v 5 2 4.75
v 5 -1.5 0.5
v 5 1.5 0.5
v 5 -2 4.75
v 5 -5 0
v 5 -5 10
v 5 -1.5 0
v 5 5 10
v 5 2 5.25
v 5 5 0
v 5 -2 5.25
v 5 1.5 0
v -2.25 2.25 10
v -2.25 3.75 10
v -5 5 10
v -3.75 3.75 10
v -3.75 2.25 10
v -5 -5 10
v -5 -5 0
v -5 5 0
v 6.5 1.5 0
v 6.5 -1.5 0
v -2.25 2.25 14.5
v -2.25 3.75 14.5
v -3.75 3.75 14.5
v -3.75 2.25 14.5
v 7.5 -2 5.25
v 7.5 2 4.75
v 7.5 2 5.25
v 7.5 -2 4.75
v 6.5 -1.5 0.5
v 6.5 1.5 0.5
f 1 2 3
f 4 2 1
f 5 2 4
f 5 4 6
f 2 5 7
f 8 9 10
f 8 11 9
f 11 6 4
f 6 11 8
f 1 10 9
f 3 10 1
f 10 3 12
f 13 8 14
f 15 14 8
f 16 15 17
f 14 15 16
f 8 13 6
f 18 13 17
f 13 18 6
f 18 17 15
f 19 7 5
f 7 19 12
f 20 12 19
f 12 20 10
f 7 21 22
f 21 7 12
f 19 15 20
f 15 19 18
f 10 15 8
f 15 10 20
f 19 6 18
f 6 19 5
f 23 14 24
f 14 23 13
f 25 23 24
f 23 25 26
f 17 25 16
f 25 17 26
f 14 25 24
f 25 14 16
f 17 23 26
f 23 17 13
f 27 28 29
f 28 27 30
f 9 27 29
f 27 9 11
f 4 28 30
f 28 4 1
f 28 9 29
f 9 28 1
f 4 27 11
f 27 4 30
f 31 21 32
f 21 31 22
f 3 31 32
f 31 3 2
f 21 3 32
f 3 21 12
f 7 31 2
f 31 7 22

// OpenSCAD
//main base
translate([0,0,5])
    cube([10,10,10],center=true);
//chimny
translate([-3,3,12])
    cube([1.5,1.5,5],center=true);
//front roof
translate([5,0,5])
    cube([5,4,.5],center=true);
//door step
translate([5,-1.5,0])
    cube([1.5,3,.5]);
